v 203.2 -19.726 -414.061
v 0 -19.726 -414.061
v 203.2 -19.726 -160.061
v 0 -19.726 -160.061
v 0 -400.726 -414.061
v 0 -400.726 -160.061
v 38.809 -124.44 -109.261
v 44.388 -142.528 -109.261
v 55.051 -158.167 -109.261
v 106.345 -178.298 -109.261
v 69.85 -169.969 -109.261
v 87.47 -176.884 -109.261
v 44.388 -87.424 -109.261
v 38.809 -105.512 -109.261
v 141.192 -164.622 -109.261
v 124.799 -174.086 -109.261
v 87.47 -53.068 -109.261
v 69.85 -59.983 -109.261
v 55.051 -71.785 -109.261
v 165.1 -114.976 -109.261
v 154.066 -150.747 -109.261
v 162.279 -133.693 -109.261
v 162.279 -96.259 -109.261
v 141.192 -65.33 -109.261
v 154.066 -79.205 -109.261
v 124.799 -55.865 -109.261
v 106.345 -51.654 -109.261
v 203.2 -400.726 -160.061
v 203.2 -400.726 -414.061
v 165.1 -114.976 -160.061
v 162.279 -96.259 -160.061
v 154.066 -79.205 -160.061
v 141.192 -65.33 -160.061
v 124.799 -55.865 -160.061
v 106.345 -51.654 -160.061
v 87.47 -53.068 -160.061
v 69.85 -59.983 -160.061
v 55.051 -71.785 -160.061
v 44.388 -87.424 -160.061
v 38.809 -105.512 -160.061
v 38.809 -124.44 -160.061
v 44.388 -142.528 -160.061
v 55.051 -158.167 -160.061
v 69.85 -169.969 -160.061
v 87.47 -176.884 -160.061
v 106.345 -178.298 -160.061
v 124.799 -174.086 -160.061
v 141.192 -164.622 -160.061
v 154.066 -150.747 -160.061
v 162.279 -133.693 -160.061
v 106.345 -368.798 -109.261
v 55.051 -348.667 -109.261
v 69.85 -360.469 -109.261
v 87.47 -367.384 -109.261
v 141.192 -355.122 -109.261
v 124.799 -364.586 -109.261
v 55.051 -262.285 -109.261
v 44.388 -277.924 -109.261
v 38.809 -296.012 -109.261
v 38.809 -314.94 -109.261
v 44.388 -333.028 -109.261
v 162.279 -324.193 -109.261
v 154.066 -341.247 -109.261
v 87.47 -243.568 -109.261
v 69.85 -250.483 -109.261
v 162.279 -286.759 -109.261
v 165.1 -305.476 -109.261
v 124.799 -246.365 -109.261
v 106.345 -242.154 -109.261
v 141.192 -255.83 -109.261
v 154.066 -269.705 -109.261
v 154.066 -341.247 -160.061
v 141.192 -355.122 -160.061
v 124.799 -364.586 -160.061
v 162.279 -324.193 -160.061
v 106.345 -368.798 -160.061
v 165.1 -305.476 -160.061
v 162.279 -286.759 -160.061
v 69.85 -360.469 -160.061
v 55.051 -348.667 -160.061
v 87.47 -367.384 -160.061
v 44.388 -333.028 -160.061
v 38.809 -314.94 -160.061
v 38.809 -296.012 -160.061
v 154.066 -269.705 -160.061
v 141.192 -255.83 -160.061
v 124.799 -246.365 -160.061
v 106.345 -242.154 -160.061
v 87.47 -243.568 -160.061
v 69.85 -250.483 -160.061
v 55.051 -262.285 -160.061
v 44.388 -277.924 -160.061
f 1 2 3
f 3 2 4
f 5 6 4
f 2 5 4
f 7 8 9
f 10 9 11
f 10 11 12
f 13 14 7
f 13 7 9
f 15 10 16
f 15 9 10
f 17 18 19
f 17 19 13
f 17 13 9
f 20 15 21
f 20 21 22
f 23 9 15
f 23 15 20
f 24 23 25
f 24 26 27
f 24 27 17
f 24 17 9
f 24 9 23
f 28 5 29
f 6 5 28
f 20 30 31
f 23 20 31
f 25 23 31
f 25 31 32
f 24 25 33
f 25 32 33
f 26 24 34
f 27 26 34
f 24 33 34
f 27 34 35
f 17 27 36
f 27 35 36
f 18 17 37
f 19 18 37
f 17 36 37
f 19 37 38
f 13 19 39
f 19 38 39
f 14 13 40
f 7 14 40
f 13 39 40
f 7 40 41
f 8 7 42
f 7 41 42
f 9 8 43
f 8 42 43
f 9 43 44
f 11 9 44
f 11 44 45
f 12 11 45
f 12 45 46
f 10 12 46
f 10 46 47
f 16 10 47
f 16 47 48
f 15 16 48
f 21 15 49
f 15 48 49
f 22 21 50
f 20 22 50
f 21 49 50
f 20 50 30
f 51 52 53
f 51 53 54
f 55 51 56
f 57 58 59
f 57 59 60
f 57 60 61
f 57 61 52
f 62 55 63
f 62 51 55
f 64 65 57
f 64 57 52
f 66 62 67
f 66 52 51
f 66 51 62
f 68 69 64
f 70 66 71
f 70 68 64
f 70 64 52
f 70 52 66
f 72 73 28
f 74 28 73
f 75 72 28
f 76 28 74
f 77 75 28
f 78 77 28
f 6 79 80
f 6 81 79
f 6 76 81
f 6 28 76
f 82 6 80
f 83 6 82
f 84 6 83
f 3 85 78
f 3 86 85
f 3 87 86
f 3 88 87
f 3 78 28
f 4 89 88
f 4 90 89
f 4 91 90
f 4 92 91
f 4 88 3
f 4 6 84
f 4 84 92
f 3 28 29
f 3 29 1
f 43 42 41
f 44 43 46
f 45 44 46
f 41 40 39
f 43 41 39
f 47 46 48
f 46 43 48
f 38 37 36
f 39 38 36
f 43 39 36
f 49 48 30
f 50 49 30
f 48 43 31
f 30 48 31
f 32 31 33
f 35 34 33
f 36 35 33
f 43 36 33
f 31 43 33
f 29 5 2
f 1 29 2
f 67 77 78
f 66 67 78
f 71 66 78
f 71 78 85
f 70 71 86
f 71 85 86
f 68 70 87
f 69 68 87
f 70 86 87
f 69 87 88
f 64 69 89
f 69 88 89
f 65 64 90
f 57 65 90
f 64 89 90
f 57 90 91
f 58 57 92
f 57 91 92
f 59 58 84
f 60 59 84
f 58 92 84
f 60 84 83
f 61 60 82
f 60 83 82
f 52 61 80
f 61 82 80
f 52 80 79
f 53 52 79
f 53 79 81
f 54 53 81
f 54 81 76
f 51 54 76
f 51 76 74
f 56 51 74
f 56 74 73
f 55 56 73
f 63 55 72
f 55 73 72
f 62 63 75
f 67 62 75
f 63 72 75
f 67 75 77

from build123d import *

# Parameters (mm, degrees)
F0_W     = 381
F0_H     = 254
F1_DEPTH = 203.2
F2_R     = 63.5
F3_DEPTH = 50.8
F4_R     = 63.5
F5_DEPTH = 50.8
F6_R     = 12.7
F7_DEPTH = 152.4


with BuildPart() as f1:
    # F0 (on Right) → F1 (new body)
    with BuildSketch(Plane.YZ):
        with Locations((-210.225967, -287.060984)):
            Rectangle(F0_W, F0_H)
    extrude(amount=F1_DEPTH)

    # F4 (on face) → F5 (join)
    with BuildSketch(Plane.XY.offset(-160.060984)):
        with Locations((101.6, -305.475967)):
            Circle(F4_R)
    extrude(amount=F5_DEPTH)

    # F6 (on face) → F7 (join)
    with BuildSketch(Plane(origin=(0, 0, -414.060984), x_dir=(1, 0, 0), z_dir=(0, 0, -1))):
        with Locations((101.6, 210.225967)):
            Circle(F6_R)
    extrude(amount=-F7_DEPTH)


with BuildPart() as f3:
    # F2 (on face) → F3 (new body)
    with BuildSketch(Plane.XY.offset(-160.060984)):
        with Locations((101.6, -114.975967)):
            Circle(F2_R)
    extrude(amount=F3_DEPTH)


solid = Compound([f1.part, f3.part])
